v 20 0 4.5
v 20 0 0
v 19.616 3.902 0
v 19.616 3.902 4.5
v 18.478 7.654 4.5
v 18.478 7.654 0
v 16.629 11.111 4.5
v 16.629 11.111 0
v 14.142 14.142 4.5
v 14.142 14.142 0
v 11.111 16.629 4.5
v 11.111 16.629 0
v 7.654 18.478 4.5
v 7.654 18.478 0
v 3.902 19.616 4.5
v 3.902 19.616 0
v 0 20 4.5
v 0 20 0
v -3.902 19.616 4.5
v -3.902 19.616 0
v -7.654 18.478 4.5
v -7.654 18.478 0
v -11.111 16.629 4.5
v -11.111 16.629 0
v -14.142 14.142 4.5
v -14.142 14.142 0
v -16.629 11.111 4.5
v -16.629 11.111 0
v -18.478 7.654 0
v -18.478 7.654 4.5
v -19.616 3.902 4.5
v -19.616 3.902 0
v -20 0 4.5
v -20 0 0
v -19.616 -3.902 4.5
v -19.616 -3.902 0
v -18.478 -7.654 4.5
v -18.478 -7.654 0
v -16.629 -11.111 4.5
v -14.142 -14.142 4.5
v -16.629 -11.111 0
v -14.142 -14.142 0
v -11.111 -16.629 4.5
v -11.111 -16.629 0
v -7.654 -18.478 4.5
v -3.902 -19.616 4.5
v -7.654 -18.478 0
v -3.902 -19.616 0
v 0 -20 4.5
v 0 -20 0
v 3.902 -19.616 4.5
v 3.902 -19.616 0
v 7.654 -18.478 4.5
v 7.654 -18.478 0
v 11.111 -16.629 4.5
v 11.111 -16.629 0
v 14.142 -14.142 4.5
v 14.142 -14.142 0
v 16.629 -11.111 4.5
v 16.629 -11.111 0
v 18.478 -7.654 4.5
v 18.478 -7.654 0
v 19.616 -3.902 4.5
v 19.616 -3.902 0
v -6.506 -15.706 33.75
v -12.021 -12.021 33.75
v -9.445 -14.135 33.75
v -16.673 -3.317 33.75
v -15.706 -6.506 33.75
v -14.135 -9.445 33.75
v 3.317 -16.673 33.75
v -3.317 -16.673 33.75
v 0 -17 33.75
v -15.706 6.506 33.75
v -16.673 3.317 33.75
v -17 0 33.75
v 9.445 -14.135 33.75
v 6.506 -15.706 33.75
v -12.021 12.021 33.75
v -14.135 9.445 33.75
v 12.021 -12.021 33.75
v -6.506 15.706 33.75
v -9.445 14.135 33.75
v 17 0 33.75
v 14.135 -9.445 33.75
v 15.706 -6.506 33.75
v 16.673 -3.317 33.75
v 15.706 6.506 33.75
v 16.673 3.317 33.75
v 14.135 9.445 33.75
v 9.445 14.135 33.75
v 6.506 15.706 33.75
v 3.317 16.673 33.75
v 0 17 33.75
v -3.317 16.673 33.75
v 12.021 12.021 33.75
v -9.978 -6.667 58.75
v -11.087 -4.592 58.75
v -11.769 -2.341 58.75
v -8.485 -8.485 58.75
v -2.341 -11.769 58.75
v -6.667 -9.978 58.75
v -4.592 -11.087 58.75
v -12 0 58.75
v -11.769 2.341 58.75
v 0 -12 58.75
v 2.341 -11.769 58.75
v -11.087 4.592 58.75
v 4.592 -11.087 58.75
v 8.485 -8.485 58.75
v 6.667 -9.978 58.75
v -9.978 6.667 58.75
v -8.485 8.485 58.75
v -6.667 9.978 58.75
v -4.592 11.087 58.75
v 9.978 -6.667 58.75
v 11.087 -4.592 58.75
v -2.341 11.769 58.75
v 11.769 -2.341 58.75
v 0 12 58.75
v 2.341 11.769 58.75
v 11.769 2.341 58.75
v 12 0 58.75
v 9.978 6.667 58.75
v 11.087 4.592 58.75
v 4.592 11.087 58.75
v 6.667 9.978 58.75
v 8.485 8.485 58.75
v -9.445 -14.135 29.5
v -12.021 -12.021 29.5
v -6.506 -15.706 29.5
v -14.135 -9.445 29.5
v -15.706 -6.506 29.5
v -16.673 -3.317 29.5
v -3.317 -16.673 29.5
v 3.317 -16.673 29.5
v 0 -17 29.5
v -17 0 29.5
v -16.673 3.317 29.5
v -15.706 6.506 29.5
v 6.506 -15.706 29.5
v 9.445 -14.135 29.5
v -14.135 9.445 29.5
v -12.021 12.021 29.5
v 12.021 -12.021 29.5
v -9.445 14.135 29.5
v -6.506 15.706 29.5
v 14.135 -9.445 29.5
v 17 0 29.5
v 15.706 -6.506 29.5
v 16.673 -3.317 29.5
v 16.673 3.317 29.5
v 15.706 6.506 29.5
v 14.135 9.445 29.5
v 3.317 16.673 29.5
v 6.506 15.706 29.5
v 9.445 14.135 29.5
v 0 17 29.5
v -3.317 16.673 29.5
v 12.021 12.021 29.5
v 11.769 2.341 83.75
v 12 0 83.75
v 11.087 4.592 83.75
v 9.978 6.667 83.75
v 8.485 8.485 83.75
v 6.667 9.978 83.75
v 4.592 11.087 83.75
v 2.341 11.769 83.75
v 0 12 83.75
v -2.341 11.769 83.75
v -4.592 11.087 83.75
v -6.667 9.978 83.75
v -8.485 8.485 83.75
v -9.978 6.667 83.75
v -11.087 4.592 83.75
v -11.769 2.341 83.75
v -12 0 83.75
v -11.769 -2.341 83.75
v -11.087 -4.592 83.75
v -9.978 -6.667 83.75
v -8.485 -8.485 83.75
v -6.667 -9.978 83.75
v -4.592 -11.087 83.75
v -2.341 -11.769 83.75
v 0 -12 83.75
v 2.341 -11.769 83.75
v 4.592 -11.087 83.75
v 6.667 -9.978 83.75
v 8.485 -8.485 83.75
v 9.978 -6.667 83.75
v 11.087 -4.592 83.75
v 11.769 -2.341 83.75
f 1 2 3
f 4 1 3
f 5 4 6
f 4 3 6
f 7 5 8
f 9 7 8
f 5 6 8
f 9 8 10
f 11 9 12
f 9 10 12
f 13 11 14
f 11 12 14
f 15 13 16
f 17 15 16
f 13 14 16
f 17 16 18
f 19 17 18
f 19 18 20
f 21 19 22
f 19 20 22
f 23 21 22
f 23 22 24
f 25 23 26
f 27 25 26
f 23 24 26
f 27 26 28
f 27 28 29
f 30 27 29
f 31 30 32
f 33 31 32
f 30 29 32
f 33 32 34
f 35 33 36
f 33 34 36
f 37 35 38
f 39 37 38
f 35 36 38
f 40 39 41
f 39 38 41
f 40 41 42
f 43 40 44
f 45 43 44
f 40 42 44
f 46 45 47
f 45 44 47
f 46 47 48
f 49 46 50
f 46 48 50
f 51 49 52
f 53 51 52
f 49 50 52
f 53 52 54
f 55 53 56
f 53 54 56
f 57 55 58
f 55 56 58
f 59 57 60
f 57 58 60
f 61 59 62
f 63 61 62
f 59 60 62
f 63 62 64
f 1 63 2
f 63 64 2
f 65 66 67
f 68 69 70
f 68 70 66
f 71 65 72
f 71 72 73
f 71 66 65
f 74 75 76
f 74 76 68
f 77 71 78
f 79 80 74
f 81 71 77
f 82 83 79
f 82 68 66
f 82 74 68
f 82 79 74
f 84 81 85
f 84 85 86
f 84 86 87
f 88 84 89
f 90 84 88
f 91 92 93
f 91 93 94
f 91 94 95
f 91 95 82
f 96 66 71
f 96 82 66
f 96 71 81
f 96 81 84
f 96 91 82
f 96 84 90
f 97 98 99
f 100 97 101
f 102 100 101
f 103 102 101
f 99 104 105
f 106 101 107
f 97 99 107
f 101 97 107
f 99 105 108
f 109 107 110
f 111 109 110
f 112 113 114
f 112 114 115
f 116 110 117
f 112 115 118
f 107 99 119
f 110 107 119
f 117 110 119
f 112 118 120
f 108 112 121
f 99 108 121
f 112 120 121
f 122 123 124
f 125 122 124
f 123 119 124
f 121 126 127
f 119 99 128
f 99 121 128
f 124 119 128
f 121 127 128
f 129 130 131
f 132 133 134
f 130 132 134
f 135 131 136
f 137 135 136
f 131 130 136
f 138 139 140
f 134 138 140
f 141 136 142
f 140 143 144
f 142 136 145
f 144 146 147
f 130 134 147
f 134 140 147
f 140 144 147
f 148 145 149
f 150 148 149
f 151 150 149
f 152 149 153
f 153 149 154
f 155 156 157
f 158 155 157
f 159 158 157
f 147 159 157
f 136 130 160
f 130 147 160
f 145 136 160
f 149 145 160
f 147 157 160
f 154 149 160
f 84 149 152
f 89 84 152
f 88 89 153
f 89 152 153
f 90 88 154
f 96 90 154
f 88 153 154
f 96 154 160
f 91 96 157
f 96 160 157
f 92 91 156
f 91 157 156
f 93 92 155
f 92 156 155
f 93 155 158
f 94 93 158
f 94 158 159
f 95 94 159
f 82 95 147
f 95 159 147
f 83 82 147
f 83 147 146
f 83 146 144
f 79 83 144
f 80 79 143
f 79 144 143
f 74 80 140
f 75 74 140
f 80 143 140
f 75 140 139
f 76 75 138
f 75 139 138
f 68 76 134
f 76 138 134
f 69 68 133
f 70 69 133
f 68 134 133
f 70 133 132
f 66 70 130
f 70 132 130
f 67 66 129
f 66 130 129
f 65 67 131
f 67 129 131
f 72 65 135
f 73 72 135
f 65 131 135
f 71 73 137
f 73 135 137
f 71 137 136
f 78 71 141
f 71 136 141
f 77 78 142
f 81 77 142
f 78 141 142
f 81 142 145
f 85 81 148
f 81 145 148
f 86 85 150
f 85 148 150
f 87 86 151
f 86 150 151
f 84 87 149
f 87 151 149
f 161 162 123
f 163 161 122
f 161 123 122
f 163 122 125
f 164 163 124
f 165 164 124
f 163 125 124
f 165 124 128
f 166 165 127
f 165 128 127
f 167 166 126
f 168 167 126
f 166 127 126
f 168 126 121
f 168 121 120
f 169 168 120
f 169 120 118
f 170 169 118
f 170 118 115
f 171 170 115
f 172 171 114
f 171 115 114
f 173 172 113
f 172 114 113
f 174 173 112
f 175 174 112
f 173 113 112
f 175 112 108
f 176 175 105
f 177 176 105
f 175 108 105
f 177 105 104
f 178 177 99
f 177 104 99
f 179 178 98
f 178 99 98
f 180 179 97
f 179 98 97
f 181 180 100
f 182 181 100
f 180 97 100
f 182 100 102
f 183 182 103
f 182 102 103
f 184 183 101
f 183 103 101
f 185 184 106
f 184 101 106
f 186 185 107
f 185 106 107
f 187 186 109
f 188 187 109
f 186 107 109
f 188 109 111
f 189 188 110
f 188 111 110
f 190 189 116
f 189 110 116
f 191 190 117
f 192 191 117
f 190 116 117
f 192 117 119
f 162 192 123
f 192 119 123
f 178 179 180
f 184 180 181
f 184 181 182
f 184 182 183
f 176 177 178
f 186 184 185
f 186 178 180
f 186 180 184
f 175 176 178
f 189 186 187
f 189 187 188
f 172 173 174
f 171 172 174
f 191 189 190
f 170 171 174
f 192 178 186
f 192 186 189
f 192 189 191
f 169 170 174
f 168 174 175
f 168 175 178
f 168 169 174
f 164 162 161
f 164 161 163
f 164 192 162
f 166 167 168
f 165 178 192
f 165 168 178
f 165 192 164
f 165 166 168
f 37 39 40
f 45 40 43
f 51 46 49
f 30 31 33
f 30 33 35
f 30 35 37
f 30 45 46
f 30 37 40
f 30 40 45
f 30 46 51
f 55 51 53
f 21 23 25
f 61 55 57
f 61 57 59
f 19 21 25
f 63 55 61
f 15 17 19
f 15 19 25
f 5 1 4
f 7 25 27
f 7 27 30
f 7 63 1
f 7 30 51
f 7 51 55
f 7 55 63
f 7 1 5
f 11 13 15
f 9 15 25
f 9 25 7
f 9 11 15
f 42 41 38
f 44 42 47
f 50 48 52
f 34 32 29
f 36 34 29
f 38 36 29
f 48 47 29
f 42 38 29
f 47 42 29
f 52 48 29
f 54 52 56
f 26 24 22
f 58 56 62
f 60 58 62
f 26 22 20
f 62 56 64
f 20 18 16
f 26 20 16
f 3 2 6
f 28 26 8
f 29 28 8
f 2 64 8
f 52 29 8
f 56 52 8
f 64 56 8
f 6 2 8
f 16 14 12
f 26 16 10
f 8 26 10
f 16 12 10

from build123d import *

# Parameters (mm, degrees)
F0_R     = 20
F1_DEPTH = 4.5
F3_R     = 17
F4_DEPTH = 4.25
F6_R     = 12
F7_DEPTH = 25


with BuildPart() as f1:
    # F0 (on Top) → F1 (new body)
    with BuildSketch(Plane.XY):
        Circle(F0_R)
    extrude(amount=F1_DEPTH)


with BuildPart() as f4:
    # F3 (on offset) → F4 (new body)
    with BuildSketch(Plane.XY.offset(29.5)):
        Circle(F3_R)
    extrude(amount=F4_DEPTH)


with BuildPart() as f7:
    # F6 (on offset) → F7 (new body)
    with BuildSketch(Plane.XY.offset(58.75)):
        Circle(F6_R)
    extrude(amount=F7_DEPTH)


solid = Compound([f1.part, f4.part, f7.part])
